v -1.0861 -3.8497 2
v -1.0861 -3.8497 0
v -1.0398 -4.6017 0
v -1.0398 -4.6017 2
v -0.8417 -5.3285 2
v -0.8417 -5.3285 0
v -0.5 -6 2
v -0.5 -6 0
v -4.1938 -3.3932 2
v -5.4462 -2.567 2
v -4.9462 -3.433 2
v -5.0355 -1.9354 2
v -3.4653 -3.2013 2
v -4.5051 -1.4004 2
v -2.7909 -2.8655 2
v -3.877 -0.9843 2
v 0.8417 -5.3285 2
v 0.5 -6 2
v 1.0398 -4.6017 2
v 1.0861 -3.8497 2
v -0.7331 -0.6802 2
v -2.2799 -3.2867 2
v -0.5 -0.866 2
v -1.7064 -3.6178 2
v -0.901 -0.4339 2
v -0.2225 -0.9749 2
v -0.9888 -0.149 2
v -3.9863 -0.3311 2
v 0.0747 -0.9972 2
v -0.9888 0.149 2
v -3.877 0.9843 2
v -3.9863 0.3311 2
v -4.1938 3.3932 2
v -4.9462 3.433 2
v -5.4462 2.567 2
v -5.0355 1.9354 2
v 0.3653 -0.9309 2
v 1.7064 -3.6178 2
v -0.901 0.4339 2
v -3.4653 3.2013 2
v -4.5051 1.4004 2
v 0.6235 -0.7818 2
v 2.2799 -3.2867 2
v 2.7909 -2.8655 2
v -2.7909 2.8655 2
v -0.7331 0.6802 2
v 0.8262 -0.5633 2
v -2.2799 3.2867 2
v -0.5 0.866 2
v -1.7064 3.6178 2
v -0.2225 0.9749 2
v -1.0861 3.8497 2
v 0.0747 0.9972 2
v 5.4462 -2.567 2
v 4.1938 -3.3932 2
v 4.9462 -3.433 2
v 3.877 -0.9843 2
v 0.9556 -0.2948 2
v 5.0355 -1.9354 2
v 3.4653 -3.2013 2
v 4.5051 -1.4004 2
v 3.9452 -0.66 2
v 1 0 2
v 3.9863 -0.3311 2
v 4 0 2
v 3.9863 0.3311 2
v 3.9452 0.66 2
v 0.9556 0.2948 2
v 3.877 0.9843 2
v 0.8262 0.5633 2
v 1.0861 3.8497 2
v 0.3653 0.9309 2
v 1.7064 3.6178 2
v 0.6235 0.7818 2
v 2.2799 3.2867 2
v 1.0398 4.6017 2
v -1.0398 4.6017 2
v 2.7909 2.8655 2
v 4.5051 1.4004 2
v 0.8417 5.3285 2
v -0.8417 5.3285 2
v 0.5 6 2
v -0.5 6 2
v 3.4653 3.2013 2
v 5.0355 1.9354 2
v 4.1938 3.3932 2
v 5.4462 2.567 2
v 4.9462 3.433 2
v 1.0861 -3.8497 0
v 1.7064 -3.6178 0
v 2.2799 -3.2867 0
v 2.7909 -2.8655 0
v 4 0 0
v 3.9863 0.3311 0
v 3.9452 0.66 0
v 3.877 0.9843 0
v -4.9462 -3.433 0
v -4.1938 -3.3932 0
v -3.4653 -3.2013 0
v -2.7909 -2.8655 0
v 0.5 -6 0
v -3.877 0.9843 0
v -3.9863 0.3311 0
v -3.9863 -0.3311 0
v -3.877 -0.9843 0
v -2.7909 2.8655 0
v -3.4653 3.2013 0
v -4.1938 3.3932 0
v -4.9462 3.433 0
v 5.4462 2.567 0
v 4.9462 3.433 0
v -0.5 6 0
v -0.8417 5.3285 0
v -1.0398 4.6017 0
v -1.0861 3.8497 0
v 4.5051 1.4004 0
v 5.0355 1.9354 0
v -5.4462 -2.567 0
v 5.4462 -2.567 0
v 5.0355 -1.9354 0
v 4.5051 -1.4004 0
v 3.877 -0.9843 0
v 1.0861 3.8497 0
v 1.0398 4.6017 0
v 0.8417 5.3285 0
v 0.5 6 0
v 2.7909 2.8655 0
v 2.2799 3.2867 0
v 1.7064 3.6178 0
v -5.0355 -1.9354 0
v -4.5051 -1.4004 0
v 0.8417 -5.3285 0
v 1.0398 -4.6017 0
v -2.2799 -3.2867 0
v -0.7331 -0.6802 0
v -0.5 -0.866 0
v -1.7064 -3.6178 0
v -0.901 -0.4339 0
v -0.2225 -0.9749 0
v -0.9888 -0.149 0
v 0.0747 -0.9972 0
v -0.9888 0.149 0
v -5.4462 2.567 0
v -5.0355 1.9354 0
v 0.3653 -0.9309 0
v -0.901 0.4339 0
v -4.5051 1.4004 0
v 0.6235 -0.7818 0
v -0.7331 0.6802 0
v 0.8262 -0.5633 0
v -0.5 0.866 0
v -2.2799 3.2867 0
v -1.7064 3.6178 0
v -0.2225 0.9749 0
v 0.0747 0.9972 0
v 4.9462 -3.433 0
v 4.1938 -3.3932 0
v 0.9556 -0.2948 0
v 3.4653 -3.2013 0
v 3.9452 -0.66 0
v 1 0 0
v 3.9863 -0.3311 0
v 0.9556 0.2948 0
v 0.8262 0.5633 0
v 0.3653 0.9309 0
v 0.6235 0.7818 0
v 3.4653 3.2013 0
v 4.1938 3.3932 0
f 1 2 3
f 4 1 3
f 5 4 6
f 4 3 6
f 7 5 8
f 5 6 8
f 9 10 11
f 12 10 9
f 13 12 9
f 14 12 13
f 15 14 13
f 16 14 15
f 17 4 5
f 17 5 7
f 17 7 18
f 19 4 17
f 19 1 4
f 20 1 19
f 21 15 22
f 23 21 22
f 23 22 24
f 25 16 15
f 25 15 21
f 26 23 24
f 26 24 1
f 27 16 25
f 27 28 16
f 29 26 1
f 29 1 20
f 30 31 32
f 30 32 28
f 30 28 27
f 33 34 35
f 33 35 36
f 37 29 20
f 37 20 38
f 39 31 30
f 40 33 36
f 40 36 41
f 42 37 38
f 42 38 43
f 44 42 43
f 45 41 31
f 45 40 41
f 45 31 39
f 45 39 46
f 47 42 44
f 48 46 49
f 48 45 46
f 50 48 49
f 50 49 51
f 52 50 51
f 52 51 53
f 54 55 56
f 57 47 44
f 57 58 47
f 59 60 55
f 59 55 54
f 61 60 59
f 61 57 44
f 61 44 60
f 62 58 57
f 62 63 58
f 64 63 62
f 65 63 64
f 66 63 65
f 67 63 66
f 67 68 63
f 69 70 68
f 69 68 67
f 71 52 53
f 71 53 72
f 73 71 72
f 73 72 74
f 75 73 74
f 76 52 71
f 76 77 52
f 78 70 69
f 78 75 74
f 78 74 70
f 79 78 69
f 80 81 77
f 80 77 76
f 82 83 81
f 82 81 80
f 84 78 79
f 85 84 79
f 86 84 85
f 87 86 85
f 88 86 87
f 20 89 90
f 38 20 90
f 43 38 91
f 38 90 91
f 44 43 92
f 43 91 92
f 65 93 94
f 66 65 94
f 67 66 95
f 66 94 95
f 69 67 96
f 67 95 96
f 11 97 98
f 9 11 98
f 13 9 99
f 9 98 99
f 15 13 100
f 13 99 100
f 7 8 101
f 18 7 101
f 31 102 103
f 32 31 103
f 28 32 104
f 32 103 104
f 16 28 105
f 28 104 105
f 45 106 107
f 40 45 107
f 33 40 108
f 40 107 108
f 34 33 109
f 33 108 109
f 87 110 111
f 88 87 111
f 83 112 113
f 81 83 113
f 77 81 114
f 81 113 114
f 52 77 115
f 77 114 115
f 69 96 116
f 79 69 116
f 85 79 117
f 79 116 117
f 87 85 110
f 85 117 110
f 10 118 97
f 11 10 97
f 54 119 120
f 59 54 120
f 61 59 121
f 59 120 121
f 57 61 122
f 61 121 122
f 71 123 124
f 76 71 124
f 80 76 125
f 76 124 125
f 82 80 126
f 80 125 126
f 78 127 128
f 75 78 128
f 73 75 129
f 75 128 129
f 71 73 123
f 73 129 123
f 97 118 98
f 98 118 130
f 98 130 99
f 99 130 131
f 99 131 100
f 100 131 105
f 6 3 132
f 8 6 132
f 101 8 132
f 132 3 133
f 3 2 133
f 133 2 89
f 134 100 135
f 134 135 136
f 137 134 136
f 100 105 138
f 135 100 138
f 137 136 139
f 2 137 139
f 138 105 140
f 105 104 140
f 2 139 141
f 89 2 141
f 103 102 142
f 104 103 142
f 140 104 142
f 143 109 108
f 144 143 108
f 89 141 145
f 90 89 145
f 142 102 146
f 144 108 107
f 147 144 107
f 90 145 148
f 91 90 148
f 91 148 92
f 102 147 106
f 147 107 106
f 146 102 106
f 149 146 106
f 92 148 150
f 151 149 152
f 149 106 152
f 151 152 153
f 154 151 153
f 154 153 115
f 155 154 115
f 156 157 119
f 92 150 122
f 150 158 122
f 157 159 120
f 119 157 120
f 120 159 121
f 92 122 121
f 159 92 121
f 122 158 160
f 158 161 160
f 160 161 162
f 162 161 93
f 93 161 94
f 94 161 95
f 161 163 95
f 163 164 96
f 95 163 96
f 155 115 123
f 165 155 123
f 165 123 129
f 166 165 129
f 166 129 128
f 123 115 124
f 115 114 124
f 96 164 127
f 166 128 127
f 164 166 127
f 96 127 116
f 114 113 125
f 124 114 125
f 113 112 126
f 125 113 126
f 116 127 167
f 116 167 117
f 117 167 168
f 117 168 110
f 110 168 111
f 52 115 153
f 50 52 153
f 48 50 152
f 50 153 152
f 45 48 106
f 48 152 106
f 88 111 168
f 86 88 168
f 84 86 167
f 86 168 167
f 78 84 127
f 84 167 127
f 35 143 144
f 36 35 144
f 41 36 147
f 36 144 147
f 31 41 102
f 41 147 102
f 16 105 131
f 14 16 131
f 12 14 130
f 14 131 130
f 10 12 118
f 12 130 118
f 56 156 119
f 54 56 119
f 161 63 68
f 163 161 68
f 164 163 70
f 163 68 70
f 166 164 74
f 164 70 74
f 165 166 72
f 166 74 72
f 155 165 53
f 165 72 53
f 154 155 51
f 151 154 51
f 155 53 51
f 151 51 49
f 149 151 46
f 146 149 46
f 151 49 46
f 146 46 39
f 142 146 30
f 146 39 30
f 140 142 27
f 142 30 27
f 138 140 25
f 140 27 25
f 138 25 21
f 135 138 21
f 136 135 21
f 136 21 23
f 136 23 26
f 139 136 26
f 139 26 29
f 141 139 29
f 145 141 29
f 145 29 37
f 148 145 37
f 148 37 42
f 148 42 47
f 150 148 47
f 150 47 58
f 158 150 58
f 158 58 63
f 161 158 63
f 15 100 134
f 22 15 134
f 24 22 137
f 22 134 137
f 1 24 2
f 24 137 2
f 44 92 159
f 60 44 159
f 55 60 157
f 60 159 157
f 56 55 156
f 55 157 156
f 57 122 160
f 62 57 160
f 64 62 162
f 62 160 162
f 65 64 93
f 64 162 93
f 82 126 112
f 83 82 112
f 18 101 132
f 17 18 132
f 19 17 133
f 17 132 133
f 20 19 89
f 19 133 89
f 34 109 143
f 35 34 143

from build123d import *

# Parameters (mm, degrees)
F1_DEPTH = 2
F2_R     = 1
F3_DEPTH = 2.001


with BuildPart() as f1:
    # F0 (on Top) → F1 (new body)
    with BuildSketch(Plane.XY):
        with BuildLine():
            ThreePointArc((3.877013, -0.984261), (3.969134, -0.495958), (4, 0))
            ThreePointArc((4, 0), (3.969134, 0.495958), (3.877013, 0.984261))
            ThreePointArc((3.877013, 0.984261), (3.464102, 2), (2.790902, 2.865461))
            ThreePointArc((2.790902, 2.865461), (2, 3.464102), (1.086111, 3.849722))
            ThreePointArc((1.086111, 3.849722), (0.548229, 3.962252), (0, 4))
            ThreePointArc((0, 4), (-0.548229, 3.962252), (-1.086111, 3.849722))
            ThreePointArc((-1.086111, 3.849722), (-2, 3.464102), (-2.790902, 2.865461))
            ThreePointArc((-2.790902, 2.865461), (-3.464102, 2), (-3.877013, 0.984261))
            ThreePointArc((-3.877013, 0.984261), (-4, 0), (-3.877013, -0.984261))
            ThreePointArc((-3.877013, -0.984261), (-3.464102, -2), (-2.790902, -2.865461))
            ThreePointArc((-2.790902, -2.865461), (-2, -3.464102), (-1.086111, -3.849722))
            ThreePointArc((-1.086111, -3.849722), (0, -4), (1.086111, -3.849722))
            ThreePointArc((1.086111, -3.849722), (2, -3.464102), (2.790902, -2.865461))
            ThreePointArc((2.790902, -2.865461), (3.464102, -2), (3.877013, -0.984261))
        make_face()
        with BuildLine():
            ThreePointArc((2.790902, 2.865461), (3.464102, 2), (3.877013, 0.984261))
            ThreePointArc((3.877013, 0.984261), (4.783962, 1.654296), (5.446152, 2.566987))
            Line((5.446152, 2.566987), (5.196152, 3))
            Line((5.196152, 3), (4.946152, 3.433013))
            ThreePointArc((4.946152, 3.433013), (3.824643, 3.315885), (2.790902, 2.865461))
        make_face()
        with BuildLine():
            ThreePointArc((5.446152, -2.566987), (4.783962, -1.654296), (3.877013, -0.984261))
            ThreePointArc((3.877013, -0.984261), (3.464102, -2), (2.790902, -2.865461))
            ThreePointArc((2.790902, -2.865461), (3.824643, -3.315885), (4.946152, -3.433013))
            Line((4.946152, -3.433013), (5.196152, -3))
            Line((5.196152, -3), (5.446152, -2.566987))
        make_face()
        with BuildLine():
            ThreePointArc((0, 4), (0.548229, 3.962252), (1.086111, 3.849722))
            ThreePointArc((1.086111, 3.849722), (0.959319, 4.97018), (0.5, 6))
            Line((0.5, 6), (0, 6))
            Line((0, 6), (0, 4))
        make_face()
        with BuildLine():
            ThreePointArc((0.5, -6), (0.959319, -4.97018), (1.086111, -3.849722))
            ThreePointArc((1.086111, -3.849722), (0, -4), (-1.086111, -3.849722))
            ThreePointArc((-1.086111, -3.849722), (-0.959319, -4.97018), (-0.5, -6))
            Line((-0.5, -6), (0, -6))
            Line((0, -6), (0.5, -6))
        make_face()
        with BuildLine():
            ThreePointArc((-1.086111, 3.849722), (-0.548229, 3.962252), (0, 4))
            Line((0, 4), (0, 6))
            Line((0, 6), (-0.5, 6))
            ThreePointArc((-0.5, 6), (-0.959319, 4.97018), (-1.086111, 3.849722))
        make_face()
        with BuildLine():
            ThreePointArc((-4.946152, -3.433013), (-3.824643, -3.315885), (-2.790902, -2.865461))
            ThreePointArc((-2.790902, -2.865461), (-3.464102, -2), (-3.877013, -0.984261))
            ThreePointArc((-3.877013, -0.984261), (-4.783962, -1.654296), (-5.446152, -2.566987))
            Line((-5.446152, -2.566987), (-5.196152, -3))
            Line((-5.196152, -3), (-4.946152, -3.433013))
        make_face()
        with BuildLine():
            ThreePointArc((-3.877013, 0.984261), (-3.464102, 2), (-2.790902, 2.865461))
            ThreePointArc((-2.790902, 2.865461), (-3.824643, 3.315885), (-4.946152, 3.433013))
            Line((-4.946152, 3.433013), (-5.196152, 3))
            Line((-5.196152, 3), (-5.446152, 2.566987))
            ThreePointArc((-5.446152, 2.566987), (-4.783962, 1.654296), (-3.877013, 0.984261))
        make_face()
    extrude(amount=F1_DEPTH)

    # F2 (on face) → F3 (cut, through all)
    with BuildSketch(Plane.XY.offset(2)):
        Circle(F2_R)
    extrude(amount=-F3_DEPTH, mode=Mode.SUBTRACT)


solid = f1.part
